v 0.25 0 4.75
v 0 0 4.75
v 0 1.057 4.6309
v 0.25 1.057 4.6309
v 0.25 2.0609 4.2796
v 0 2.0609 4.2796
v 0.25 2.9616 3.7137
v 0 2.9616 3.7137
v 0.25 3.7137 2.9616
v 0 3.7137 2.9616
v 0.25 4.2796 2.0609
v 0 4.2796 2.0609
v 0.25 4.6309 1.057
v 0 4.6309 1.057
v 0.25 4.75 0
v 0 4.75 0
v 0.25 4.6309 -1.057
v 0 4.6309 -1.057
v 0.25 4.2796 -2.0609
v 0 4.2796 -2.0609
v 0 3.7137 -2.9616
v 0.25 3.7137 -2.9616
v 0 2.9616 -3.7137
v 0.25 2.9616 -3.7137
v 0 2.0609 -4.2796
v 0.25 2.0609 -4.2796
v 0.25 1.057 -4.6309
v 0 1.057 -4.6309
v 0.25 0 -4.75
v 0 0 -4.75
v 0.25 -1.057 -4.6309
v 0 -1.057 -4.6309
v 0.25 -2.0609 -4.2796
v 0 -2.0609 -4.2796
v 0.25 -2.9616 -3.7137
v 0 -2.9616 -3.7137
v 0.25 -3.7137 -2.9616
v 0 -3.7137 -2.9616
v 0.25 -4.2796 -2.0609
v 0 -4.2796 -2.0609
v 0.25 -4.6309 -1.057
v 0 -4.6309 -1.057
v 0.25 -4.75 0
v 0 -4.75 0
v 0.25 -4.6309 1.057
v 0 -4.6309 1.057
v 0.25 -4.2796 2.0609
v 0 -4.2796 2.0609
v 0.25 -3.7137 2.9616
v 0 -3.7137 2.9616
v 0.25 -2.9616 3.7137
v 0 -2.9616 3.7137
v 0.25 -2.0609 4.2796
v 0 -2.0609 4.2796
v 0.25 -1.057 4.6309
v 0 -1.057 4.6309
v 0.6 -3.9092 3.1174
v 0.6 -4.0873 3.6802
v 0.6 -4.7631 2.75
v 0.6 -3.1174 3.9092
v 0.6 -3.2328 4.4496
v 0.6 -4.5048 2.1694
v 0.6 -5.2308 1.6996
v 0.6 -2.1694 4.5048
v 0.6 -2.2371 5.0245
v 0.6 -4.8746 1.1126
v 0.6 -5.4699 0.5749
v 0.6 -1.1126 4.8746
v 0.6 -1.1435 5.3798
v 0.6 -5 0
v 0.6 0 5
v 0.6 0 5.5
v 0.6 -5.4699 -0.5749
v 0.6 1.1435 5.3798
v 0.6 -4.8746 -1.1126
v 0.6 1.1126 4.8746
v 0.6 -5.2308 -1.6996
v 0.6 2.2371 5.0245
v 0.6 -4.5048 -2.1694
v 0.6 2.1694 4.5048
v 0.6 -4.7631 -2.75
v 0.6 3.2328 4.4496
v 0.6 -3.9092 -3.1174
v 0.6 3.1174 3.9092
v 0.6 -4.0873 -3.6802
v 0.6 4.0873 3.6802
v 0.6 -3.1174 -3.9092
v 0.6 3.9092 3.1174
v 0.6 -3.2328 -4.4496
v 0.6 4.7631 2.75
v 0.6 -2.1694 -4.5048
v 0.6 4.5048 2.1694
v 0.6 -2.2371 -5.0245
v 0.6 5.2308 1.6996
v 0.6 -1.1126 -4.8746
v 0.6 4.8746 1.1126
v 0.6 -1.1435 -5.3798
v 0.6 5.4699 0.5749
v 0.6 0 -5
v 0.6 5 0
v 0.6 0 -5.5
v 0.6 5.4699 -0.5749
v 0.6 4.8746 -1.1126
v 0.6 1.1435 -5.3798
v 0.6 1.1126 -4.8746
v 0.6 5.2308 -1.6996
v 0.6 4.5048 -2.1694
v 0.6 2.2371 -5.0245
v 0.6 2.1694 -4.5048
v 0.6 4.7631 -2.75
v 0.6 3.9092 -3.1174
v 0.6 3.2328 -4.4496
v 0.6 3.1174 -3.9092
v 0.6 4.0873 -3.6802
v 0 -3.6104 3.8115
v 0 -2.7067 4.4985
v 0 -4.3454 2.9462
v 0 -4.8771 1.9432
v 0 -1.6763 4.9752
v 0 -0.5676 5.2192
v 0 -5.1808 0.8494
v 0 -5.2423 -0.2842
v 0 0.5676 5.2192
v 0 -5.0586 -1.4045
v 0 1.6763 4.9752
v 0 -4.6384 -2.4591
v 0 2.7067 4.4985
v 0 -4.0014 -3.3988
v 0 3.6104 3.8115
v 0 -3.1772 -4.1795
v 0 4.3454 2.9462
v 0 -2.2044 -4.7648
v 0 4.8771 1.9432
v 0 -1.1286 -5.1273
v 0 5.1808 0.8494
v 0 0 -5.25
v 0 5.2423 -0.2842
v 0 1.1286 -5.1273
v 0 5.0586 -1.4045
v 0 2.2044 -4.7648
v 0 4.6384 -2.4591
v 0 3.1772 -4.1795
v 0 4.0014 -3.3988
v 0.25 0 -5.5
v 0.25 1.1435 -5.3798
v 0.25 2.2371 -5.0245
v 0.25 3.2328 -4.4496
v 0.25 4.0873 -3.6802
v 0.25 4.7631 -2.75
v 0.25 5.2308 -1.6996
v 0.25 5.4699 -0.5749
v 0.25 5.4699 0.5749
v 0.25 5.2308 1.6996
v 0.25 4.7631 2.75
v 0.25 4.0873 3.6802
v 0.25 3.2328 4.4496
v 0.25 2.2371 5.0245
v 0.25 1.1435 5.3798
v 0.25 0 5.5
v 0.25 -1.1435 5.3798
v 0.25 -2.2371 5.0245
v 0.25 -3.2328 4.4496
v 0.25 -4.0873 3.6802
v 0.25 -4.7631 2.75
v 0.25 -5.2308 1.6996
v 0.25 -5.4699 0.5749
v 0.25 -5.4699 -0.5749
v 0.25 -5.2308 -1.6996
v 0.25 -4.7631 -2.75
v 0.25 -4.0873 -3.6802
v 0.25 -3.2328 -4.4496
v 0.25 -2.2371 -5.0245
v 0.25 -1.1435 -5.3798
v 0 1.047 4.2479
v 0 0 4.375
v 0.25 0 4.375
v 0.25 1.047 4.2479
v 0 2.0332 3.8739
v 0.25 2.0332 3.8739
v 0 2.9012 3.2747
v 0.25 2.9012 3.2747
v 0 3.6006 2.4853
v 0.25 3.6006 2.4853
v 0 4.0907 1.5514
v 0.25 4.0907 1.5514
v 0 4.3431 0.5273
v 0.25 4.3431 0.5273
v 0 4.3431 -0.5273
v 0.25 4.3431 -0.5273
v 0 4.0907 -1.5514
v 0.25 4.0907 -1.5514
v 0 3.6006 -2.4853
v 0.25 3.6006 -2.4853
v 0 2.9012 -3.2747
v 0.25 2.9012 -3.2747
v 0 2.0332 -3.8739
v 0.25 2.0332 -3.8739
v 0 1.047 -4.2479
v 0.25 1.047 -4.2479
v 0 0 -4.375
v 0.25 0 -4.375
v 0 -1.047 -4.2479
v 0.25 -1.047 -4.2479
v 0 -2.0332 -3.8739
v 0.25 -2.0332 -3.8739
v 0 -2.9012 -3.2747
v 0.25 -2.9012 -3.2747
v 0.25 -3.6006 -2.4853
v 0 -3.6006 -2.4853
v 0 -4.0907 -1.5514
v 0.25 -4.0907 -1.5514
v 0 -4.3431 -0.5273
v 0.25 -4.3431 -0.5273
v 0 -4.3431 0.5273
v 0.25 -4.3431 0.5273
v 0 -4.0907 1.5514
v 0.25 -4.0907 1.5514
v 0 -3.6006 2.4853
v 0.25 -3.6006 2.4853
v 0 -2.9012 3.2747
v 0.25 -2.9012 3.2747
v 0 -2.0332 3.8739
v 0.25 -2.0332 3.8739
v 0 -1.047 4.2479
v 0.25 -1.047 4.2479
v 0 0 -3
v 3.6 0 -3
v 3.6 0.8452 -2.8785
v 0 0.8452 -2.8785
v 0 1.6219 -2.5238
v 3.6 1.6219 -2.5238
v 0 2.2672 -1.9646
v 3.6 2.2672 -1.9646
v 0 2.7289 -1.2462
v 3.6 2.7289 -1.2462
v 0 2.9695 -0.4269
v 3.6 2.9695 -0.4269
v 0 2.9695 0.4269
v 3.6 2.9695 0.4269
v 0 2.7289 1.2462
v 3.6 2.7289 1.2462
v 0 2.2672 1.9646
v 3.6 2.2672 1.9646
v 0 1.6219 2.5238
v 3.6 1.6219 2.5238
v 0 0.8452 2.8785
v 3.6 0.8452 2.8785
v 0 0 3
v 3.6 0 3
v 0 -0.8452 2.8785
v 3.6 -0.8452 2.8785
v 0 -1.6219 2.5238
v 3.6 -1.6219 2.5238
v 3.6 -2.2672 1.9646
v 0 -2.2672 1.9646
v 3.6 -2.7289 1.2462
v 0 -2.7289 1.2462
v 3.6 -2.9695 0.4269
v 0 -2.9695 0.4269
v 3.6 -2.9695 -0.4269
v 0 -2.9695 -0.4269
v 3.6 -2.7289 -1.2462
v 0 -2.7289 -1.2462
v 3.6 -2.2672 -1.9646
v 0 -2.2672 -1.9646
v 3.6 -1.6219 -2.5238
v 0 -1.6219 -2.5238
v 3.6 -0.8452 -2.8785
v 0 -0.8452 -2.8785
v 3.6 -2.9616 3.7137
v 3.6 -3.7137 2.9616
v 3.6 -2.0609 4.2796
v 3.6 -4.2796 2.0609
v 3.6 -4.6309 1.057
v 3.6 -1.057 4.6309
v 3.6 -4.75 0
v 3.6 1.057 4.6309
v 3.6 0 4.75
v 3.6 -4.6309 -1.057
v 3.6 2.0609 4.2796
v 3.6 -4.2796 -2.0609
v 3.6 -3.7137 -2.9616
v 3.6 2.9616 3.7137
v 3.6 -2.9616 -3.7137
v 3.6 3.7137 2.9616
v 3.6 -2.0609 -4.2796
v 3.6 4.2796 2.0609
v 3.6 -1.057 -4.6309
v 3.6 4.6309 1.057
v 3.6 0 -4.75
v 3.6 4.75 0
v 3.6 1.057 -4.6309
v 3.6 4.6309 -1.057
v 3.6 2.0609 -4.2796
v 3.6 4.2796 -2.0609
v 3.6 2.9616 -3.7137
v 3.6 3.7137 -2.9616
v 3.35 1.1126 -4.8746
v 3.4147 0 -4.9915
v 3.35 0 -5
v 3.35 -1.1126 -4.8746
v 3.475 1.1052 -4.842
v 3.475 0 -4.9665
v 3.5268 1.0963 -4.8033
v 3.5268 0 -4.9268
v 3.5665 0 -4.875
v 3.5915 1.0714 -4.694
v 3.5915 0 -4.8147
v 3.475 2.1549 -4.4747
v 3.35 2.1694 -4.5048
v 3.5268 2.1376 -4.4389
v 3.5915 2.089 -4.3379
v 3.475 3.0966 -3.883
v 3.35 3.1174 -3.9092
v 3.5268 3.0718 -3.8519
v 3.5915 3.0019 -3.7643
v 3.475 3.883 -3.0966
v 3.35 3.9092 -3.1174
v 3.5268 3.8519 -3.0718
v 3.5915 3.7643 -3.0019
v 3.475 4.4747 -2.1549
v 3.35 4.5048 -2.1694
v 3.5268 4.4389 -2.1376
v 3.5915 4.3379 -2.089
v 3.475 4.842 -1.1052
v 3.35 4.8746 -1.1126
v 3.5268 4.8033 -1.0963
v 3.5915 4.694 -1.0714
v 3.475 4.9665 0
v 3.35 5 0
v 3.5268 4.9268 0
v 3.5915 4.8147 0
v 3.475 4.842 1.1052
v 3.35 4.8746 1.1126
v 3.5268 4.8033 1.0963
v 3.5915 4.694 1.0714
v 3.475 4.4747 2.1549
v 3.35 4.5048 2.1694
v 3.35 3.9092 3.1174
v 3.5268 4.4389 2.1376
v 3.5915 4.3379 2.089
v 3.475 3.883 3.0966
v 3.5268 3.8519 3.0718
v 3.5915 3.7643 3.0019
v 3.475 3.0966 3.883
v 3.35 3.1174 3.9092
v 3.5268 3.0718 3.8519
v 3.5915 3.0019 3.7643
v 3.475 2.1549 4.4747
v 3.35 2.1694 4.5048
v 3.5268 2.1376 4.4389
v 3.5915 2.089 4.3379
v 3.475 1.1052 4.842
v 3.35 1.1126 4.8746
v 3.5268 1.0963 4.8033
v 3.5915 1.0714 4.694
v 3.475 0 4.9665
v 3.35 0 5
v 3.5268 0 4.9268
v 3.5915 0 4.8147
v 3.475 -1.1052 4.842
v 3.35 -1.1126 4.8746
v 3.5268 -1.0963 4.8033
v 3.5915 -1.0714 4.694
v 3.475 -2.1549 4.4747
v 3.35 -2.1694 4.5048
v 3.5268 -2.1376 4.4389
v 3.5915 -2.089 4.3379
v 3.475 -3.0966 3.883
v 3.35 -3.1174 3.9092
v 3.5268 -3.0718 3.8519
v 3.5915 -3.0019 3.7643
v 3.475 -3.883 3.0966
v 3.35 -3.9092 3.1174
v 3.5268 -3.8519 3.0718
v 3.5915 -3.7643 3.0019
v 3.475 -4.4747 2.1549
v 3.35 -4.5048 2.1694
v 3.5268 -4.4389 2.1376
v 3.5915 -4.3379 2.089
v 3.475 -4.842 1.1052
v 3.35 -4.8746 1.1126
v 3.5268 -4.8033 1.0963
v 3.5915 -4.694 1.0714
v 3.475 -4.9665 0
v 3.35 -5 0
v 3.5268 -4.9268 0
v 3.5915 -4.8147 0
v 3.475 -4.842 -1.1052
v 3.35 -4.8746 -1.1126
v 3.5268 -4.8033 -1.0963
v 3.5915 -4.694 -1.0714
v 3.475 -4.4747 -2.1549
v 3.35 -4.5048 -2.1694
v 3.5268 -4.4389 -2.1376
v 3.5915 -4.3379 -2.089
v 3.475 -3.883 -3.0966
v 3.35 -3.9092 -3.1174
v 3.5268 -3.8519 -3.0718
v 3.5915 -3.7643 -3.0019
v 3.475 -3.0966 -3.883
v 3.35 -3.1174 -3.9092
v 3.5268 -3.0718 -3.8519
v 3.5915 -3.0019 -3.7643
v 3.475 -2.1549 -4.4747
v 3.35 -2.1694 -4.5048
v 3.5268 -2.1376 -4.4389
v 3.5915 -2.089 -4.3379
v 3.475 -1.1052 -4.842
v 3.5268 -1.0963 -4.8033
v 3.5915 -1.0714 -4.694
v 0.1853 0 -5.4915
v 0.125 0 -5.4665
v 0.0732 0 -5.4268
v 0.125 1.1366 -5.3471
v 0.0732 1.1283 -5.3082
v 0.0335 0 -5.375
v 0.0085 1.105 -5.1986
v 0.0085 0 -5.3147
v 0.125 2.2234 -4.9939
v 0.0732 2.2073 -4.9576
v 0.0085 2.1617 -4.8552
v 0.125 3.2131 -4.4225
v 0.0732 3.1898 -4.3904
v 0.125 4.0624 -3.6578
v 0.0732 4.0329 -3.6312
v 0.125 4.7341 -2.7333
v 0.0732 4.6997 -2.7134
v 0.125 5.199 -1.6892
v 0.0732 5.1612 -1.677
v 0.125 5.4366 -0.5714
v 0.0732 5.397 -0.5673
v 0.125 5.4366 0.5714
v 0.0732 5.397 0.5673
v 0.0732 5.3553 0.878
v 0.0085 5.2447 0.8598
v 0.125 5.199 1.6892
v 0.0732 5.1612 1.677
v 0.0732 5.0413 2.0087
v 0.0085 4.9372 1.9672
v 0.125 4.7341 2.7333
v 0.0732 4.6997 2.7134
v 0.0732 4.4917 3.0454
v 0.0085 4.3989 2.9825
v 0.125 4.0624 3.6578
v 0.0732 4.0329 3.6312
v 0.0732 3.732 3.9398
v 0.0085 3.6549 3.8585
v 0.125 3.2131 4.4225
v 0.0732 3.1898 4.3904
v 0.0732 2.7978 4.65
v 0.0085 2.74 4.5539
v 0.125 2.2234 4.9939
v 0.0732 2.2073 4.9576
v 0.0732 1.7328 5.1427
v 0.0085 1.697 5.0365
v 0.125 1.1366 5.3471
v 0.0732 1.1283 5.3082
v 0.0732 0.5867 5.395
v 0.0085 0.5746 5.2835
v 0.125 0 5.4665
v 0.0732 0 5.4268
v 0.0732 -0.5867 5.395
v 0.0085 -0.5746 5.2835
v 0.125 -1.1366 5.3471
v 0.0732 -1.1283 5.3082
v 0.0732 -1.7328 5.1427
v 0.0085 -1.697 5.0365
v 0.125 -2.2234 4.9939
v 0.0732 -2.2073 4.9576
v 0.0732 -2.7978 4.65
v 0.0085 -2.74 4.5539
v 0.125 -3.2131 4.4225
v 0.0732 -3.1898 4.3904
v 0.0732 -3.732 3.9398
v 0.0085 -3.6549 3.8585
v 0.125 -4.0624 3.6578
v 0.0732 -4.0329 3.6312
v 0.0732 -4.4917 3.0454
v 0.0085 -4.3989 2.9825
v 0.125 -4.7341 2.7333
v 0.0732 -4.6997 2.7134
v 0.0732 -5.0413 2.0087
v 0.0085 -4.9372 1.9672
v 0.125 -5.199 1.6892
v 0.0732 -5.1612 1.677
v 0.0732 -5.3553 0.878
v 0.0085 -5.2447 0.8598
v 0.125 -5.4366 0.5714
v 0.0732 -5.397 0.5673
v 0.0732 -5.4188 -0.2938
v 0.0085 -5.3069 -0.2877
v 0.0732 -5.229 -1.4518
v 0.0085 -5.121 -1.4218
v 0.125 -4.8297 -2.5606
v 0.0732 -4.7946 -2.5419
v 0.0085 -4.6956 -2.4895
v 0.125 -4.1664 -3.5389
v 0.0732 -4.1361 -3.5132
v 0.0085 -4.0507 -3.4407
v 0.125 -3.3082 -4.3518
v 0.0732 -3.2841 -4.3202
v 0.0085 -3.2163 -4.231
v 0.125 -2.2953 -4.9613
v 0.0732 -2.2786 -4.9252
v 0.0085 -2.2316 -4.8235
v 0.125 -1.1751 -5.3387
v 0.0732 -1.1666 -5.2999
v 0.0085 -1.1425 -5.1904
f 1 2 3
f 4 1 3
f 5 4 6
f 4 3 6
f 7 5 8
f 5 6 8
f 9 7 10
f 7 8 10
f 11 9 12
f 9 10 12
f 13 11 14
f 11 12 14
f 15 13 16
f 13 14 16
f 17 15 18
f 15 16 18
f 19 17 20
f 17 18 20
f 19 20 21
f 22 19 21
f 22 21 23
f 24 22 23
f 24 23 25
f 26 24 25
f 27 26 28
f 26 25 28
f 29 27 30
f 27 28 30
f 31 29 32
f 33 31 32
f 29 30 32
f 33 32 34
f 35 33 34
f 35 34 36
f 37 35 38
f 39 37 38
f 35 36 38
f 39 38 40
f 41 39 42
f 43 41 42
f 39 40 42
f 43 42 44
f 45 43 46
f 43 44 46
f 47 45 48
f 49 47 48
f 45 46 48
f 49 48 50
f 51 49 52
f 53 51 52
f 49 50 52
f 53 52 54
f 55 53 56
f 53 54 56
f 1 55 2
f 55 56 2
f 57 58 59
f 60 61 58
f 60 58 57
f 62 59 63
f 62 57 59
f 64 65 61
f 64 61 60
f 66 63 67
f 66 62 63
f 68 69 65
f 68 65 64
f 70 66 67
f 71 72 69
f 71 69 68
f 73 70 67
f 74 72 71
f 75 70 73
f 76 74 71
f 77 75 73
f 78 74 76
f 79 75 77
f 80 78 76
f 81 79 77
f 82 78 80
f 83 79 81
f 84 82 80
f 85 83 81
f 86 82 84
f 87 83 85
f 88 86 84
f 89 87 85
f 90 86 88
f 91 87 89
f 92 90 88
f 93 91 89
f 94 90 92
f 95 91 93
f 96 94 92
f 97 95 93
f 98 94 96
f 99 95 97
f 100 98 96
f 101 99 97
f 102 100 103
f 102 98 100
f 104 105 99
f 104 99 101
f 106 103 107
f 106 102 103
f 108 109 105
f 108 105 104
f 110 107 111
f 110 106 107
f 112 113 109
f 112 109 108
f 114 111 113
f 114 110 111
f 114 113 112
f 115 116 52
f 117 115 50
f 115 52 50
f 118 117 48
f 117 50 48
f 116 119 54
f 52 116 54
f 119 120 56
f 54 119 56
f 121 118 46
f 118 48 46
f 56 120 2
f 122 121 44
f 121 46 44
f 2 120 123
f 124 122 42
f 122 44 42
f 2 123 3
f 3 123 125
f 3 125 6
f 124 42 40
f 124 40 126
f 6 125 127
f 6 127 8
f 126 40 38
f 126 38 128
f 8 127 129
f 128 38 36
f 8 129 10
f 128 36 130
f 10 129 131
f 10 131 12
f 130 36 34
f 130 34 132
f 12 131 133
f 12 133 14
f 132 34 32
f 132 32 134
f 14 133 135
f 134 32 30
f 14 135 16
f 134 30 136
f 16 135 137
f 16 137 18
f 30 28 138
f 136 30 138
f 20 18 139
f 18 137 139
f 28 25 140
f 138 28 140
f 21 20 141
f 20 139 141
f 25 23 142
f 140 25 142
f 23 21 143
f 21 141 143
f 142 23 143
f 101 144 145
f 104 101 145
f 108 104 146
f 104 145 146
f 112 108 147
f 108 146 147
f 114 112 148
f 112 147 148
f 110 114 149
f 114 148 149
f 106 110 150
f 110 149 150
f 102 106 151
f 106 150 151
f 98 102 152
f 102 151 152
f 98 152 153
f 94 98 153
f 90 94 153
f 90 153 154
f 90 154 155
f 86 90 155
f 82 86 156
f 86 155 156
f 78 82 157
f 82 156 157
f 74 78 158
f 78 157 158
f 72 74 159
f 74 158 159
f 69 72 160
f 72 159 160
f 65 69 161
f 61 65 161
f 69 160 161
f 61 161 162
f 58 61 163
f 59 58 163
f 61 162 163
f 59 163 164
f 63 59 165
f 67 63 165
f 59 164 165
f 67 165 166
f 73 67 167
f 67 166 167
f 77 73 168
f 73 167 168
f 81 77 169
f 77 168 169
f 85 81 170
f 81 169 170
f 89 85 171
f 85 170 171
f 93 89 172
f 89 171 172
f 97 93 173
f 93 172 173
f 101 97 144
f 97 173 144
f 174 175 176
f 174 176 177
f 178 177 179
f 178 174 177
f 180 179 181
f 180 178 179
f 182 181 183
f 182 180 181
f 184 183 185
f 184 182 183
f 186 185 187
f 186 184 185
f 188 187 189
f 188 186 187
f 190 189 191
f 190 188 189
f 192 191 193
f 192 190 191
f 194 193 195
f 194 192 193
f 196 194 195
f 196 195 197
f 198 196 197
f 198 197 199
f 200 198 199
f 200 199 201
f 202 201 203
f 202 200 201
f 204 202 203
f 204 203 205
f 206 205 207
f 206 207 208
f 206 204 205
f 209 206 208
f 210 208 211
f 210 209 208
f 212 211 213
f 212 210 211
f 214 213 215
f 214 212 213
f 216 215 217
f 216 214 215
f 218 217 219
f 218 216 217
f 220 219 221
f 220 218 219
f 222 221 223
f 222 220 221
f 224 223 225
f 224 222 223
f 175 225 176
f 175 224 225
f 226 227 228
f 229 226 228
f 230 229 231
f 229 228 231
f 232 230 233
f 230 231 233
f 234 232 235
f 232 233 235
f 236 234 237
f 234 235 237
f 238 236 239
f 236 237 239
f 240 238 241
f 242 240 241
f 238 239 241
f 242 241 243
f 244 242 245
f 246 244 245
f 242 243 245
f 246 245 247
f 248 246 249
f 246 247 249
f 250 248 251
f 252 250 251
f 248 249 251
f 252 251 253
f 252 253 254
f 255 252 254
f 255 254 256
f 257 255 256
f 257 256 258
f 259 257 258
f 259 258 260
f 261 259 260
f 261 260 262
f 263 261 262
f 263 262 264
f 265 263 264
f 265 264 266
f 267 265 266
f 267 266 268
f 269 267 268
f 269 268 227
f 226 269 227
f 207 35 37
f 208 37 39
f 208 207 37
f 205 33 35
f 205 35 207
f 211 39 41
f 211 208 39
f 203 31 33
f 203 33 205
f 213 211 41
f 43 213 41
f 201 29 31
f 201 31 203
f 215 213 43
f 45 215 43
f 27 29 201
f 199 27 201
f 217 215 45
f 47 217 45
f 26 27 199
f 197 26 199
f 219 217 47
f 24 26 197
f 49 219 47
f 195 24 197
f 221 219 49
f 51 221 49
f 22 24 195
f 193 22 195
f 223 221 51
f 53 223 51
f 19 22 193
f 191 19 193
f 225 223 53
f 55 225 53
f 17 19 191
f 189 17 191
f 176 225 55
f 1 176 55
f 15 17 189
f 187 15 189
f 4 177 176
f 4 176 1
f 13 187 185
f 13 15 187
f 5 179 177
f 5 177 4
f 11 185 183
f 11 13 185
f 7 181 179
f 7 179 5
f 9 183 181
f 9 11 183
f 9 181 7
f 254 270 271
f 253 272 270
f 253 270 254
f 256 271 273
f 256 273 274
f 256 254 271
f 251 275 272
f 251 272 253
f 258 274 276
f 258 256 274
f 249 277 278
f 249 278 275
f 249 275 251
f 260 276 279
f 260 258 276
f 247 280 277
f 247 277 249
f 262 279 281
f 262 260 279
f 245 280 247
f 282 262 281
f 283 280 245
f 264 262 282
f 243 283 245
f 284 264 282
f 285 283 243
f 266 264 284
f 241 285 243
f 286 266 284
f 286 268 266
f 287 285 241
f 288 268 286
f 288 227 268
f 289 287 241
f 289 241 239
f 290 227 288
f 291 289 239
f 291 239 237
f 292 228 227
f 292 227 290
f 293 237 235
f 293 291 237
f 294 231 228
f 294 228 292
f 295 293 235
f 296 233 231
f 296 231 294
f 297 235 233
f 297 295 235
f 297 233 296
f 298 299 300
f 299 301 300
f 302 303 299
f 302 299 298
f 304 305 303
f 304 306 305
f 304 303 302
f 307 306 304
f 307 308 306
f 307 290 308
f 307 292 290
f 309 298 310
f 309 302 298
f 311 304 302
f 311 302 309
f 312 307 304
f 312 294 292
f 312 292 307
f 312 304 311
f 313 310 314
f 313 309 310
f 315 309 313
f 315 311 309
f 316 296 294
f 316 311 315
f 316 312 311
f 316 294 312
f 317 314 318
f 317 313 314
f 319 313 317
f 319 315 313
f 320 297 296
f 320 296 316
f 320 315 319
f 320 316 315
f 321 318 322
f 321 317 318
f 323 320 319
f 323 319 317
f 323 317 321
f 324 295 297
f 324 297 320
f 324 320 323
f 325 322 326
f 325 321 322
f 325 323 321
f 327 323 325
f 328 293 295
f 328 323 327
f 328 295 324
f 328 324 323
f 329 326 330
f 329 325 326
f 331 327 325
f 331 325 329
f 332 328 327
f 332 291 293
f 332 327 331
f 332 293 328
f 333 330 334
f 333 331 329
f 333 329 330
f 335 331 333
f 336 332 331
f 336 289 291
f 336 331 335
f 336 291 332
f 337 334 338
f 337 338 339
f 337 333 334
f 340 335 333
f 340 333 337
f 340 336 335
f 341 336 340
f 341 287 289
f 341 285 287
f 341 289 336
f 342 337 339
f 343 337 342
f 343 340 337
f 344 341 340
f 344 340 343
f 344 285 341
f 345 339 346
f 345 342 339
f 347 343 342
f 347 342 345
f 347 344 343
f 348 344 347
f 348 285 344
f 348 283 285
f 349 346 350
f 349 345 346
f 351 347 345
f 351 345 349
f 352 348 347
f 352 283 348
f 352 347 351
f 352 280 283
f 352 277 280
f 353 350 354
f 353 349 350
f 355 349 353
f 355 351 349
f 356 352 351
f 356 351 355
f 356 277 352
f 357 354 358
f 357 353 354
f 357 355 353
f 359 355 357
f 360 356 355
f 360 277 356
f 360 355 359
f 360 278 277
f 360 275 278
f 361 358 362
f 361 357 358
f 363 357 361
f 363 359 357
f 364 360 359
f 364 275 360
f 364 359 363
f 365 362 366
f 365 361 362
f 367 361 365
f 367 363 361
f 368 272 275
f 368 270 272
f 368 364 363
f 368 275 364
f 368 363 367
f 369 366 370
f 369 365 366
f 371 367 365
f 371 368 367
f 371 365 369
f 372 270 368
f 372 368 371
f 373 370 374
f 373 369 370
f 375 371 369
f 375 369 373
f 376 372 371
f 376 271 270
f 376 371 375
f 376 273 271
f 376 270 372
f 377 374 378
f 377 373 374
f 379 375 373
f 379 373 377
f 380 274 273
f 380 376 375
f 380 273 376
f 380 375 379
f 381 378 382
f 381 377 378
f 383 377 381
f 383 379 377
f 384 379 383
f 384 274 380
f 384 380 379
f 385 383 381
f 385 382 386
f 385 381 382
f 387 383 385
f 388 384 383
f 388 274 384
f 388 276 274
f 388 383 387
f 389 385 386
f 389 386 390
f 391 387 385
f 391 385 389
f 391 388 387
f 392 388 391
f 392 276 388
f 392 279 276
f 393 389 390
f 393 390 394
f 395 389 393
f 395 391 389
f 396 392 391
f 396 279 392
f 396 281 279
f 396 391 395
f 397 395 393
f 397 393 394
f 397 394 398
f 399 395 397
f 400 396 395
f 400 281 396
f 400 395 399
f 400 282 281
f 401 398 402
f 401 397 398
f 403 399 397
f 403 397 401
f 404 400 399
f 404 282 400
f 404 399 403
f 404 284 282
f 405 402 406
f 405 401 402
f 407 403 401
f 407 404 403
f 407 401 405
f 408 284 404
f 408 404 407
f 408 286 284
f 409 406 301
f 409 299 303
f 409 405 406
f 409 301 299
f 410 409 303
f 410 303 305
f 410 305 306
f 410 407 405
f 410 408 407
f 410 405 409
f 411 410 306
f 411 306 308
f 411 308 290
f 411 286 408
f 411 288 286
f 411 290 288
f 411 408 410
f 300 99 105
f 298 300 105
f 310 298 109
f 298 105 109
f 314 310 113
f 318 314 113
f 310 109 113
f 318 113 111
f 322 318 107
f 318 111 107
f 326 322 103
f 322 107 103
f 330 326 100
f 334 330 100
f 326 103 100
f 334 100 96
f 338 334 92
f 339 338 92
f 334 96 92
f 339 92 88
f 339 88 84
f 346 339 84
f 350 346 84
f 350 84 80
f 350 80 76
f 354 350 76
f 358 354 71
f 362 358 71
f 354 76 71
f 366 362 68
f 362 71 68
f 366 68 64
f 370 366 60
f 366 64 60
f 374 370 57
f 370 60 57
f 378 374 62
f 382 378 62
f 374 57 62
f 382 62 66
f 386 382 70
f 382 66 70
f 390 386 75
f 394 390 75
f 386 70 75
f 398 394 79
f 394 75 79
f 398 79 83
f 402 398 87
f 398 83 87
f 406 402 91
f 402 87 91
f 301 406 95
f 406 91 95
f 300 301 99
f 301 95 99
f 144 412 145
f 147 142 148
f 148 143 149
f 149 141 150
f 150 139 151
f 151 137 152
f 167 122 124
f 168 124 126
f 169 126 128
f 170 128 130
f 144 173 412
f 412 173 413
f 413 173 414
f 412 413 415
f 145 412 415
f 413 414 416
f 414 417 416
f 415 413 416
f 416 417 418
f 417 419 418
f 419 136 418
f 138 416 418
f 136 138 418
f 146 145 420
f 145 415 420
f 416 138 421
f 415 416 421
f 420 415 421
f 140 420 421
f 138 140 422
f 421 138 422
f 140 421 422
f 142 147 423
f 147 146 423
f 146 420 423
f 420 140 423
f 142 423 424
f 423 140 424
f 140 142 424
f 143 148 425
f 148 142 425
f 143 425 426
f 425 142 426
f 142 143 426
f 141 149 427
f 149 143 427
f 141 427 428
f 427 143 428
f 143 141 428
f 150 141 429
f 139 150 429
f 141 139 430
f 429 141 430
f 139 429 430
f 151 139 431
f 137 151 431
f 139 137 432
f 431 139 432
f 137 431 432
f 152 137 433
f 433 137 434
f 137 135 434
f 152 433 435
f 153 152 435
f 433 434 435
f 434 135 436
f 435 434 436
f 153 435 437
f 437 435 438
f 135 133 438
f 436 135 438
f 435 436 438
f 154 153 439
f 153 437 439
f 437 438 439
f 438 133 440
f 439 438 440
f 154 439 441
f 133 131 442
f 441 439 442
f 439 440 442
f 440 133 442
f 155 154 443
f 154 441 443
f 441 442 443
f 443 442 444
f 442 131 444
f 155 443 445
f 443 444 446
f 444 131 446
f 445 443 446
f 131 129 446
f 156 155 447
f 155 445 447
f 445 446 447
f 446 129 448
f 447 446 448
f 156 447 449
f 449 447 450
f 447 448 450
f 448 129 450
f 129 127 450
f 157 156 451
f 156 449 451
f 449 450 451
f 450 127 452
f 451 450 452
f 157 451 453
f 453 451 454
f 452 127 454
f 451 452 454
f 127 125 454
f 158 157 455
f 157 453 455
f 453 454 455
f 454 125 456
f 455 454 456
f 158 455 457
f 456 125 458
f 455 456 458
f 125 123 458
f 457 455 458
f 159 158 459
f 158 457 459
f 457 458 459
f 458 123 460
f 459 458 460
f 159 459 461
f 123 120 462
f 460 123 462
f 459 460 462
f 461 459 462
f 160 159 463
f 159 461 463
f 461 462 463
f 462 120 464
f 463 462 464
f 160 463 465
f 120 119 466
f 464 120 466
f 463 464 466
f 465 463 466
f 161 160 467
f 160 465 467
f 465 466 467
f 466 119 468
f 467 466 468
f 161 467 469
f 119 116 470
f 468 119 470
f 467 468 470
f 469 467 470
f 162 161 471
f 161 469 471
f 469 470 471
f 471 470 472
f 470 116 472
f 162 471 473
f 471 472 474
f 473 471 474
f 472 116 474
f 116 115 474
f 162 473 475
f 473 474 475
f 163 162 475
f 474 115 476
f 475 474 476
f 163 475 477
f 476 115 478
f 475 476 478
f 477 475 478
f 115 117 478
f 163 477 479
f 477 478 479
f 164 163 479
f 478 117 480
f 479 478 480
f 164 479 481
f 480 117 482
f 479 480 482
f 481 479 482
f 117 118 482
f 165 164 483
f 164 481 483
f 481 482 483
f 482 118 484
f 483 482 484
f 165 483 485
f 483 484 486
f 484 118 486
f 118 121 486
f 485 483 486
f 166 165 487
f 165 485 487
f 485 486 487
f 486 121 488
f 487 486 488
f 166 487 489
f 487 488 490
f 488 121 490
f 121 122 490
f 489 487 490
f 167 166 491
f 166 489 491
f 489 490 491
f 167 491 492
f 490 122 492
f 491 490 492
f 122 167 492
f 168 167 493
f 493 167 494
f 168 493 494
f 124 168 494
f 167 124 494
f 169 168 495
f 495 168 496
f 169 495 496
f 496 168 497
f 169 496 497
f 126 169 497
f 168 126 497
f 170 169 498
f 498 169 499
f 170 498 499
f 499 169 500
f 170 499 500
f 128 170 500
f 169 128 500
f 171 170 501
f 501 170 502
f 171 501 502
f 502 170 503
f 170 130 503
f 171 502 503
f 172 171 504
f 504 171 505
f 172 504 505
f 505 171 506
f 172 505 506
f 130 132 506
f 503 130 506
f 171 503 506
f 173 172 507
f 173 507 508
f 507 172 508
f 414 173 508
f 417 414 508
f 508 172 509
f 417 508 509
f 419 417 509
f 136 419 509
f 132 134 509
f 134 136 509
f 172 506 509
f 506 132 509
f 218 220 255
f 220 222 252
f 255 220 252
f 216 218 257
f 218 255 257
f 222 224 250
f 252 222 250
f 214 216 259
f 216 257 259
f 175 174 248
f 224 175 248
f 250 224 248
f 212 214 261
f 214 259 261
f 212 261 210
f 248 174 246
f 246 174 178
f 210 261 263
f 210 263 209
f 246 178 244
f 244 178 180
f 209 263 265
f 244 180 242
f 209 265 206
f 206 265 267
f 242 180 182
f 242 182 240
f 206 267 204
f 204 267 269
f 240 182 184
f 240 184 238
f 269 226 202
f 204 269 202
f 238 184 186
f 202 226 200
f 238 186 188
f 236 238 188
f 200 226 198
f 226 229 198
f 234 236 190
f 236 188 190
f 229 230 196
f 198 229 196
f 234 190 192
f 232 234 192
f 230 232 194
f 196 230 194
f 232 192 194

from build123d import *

# Parameters (mm, degrees)
SKETCH1_R           = 5.5
BOSS_EXTRUDE1_DEPTH = 0.6
SKETCH2_R           = 5
BOSS_EXTRUDE2_DEPTH = 3
SKETCH3_R           = 3
CUT_EXTRUDE1_DEPTH  = 9.570880935
SKETCH4_R           = 4.75
SKETCH4_R_2         = 4.375
CUT_EXTRUDE2_DEPTH  = 0.25
FILLET1_R           = 0.25
FILLET2_R           = 0.25


with BuildPart() as part:
    # Sketch1 → Boss-Extrude1 (new body)
    with BuildSketch(Plane(origin=(0, 0, 0), x_dir=(0, 0, -1), z_dir=(1, 0, 0))):
        Circle(SKETCH1_R)
    extrude(amount=BOSS_EXTRUDE1_DEPTH)

    # Sketch2 → Boss-Extrude2 (add)
    with BuildSketch(Plane(origin=(0.6, 0, 0), x_dir=(0, 0, -1), z_dir=(1, 0, 0))):
        Circle(SKETCH2_R)
    extrude(amount=BOSS_EXTRUDE2_DEPTH)

    # Sketch3 → Cut-Extrude1 (cut, through all)
    with BuildSketch(Plane(origin=(3.6, 0, 0), x_dir=(0, 0, -1), z_dir=(1, 0, 0))):
        Circle(SKETCH3_R)
    extrude(amount=-CUT_EXTRUDE1_DEPTH, mode=Mode.SUBTRACT)

    # Sketch4 → Cut-Extrude2 (cut)
    with BuildSketch(Plane.ZY):
        Circle(SKETCH4_R)
        Circle(SKETCH4_R_2, mode=Mode.SUBTRACT)
    extrude(amount=-CUT_EXTRUDE2_DEPTH, mode=Mode.SUBTRACT)

    # Fillet1
    fillet1_edges = [part.edges().sort_by_distance(p)[0] for p in [
        (0, 0, 5.5),
    ]]
    fillet(fillet1_edges, radius=FILLET1_R)

    # Fillet2
    fillet2_edges = [part.edges().sort_by_distance(p)[0] for p in [
        (3.6, 0, 5),
    ]]
    fillet(fillet2_edges, radius=FILLET2_R)


solid = part.part
